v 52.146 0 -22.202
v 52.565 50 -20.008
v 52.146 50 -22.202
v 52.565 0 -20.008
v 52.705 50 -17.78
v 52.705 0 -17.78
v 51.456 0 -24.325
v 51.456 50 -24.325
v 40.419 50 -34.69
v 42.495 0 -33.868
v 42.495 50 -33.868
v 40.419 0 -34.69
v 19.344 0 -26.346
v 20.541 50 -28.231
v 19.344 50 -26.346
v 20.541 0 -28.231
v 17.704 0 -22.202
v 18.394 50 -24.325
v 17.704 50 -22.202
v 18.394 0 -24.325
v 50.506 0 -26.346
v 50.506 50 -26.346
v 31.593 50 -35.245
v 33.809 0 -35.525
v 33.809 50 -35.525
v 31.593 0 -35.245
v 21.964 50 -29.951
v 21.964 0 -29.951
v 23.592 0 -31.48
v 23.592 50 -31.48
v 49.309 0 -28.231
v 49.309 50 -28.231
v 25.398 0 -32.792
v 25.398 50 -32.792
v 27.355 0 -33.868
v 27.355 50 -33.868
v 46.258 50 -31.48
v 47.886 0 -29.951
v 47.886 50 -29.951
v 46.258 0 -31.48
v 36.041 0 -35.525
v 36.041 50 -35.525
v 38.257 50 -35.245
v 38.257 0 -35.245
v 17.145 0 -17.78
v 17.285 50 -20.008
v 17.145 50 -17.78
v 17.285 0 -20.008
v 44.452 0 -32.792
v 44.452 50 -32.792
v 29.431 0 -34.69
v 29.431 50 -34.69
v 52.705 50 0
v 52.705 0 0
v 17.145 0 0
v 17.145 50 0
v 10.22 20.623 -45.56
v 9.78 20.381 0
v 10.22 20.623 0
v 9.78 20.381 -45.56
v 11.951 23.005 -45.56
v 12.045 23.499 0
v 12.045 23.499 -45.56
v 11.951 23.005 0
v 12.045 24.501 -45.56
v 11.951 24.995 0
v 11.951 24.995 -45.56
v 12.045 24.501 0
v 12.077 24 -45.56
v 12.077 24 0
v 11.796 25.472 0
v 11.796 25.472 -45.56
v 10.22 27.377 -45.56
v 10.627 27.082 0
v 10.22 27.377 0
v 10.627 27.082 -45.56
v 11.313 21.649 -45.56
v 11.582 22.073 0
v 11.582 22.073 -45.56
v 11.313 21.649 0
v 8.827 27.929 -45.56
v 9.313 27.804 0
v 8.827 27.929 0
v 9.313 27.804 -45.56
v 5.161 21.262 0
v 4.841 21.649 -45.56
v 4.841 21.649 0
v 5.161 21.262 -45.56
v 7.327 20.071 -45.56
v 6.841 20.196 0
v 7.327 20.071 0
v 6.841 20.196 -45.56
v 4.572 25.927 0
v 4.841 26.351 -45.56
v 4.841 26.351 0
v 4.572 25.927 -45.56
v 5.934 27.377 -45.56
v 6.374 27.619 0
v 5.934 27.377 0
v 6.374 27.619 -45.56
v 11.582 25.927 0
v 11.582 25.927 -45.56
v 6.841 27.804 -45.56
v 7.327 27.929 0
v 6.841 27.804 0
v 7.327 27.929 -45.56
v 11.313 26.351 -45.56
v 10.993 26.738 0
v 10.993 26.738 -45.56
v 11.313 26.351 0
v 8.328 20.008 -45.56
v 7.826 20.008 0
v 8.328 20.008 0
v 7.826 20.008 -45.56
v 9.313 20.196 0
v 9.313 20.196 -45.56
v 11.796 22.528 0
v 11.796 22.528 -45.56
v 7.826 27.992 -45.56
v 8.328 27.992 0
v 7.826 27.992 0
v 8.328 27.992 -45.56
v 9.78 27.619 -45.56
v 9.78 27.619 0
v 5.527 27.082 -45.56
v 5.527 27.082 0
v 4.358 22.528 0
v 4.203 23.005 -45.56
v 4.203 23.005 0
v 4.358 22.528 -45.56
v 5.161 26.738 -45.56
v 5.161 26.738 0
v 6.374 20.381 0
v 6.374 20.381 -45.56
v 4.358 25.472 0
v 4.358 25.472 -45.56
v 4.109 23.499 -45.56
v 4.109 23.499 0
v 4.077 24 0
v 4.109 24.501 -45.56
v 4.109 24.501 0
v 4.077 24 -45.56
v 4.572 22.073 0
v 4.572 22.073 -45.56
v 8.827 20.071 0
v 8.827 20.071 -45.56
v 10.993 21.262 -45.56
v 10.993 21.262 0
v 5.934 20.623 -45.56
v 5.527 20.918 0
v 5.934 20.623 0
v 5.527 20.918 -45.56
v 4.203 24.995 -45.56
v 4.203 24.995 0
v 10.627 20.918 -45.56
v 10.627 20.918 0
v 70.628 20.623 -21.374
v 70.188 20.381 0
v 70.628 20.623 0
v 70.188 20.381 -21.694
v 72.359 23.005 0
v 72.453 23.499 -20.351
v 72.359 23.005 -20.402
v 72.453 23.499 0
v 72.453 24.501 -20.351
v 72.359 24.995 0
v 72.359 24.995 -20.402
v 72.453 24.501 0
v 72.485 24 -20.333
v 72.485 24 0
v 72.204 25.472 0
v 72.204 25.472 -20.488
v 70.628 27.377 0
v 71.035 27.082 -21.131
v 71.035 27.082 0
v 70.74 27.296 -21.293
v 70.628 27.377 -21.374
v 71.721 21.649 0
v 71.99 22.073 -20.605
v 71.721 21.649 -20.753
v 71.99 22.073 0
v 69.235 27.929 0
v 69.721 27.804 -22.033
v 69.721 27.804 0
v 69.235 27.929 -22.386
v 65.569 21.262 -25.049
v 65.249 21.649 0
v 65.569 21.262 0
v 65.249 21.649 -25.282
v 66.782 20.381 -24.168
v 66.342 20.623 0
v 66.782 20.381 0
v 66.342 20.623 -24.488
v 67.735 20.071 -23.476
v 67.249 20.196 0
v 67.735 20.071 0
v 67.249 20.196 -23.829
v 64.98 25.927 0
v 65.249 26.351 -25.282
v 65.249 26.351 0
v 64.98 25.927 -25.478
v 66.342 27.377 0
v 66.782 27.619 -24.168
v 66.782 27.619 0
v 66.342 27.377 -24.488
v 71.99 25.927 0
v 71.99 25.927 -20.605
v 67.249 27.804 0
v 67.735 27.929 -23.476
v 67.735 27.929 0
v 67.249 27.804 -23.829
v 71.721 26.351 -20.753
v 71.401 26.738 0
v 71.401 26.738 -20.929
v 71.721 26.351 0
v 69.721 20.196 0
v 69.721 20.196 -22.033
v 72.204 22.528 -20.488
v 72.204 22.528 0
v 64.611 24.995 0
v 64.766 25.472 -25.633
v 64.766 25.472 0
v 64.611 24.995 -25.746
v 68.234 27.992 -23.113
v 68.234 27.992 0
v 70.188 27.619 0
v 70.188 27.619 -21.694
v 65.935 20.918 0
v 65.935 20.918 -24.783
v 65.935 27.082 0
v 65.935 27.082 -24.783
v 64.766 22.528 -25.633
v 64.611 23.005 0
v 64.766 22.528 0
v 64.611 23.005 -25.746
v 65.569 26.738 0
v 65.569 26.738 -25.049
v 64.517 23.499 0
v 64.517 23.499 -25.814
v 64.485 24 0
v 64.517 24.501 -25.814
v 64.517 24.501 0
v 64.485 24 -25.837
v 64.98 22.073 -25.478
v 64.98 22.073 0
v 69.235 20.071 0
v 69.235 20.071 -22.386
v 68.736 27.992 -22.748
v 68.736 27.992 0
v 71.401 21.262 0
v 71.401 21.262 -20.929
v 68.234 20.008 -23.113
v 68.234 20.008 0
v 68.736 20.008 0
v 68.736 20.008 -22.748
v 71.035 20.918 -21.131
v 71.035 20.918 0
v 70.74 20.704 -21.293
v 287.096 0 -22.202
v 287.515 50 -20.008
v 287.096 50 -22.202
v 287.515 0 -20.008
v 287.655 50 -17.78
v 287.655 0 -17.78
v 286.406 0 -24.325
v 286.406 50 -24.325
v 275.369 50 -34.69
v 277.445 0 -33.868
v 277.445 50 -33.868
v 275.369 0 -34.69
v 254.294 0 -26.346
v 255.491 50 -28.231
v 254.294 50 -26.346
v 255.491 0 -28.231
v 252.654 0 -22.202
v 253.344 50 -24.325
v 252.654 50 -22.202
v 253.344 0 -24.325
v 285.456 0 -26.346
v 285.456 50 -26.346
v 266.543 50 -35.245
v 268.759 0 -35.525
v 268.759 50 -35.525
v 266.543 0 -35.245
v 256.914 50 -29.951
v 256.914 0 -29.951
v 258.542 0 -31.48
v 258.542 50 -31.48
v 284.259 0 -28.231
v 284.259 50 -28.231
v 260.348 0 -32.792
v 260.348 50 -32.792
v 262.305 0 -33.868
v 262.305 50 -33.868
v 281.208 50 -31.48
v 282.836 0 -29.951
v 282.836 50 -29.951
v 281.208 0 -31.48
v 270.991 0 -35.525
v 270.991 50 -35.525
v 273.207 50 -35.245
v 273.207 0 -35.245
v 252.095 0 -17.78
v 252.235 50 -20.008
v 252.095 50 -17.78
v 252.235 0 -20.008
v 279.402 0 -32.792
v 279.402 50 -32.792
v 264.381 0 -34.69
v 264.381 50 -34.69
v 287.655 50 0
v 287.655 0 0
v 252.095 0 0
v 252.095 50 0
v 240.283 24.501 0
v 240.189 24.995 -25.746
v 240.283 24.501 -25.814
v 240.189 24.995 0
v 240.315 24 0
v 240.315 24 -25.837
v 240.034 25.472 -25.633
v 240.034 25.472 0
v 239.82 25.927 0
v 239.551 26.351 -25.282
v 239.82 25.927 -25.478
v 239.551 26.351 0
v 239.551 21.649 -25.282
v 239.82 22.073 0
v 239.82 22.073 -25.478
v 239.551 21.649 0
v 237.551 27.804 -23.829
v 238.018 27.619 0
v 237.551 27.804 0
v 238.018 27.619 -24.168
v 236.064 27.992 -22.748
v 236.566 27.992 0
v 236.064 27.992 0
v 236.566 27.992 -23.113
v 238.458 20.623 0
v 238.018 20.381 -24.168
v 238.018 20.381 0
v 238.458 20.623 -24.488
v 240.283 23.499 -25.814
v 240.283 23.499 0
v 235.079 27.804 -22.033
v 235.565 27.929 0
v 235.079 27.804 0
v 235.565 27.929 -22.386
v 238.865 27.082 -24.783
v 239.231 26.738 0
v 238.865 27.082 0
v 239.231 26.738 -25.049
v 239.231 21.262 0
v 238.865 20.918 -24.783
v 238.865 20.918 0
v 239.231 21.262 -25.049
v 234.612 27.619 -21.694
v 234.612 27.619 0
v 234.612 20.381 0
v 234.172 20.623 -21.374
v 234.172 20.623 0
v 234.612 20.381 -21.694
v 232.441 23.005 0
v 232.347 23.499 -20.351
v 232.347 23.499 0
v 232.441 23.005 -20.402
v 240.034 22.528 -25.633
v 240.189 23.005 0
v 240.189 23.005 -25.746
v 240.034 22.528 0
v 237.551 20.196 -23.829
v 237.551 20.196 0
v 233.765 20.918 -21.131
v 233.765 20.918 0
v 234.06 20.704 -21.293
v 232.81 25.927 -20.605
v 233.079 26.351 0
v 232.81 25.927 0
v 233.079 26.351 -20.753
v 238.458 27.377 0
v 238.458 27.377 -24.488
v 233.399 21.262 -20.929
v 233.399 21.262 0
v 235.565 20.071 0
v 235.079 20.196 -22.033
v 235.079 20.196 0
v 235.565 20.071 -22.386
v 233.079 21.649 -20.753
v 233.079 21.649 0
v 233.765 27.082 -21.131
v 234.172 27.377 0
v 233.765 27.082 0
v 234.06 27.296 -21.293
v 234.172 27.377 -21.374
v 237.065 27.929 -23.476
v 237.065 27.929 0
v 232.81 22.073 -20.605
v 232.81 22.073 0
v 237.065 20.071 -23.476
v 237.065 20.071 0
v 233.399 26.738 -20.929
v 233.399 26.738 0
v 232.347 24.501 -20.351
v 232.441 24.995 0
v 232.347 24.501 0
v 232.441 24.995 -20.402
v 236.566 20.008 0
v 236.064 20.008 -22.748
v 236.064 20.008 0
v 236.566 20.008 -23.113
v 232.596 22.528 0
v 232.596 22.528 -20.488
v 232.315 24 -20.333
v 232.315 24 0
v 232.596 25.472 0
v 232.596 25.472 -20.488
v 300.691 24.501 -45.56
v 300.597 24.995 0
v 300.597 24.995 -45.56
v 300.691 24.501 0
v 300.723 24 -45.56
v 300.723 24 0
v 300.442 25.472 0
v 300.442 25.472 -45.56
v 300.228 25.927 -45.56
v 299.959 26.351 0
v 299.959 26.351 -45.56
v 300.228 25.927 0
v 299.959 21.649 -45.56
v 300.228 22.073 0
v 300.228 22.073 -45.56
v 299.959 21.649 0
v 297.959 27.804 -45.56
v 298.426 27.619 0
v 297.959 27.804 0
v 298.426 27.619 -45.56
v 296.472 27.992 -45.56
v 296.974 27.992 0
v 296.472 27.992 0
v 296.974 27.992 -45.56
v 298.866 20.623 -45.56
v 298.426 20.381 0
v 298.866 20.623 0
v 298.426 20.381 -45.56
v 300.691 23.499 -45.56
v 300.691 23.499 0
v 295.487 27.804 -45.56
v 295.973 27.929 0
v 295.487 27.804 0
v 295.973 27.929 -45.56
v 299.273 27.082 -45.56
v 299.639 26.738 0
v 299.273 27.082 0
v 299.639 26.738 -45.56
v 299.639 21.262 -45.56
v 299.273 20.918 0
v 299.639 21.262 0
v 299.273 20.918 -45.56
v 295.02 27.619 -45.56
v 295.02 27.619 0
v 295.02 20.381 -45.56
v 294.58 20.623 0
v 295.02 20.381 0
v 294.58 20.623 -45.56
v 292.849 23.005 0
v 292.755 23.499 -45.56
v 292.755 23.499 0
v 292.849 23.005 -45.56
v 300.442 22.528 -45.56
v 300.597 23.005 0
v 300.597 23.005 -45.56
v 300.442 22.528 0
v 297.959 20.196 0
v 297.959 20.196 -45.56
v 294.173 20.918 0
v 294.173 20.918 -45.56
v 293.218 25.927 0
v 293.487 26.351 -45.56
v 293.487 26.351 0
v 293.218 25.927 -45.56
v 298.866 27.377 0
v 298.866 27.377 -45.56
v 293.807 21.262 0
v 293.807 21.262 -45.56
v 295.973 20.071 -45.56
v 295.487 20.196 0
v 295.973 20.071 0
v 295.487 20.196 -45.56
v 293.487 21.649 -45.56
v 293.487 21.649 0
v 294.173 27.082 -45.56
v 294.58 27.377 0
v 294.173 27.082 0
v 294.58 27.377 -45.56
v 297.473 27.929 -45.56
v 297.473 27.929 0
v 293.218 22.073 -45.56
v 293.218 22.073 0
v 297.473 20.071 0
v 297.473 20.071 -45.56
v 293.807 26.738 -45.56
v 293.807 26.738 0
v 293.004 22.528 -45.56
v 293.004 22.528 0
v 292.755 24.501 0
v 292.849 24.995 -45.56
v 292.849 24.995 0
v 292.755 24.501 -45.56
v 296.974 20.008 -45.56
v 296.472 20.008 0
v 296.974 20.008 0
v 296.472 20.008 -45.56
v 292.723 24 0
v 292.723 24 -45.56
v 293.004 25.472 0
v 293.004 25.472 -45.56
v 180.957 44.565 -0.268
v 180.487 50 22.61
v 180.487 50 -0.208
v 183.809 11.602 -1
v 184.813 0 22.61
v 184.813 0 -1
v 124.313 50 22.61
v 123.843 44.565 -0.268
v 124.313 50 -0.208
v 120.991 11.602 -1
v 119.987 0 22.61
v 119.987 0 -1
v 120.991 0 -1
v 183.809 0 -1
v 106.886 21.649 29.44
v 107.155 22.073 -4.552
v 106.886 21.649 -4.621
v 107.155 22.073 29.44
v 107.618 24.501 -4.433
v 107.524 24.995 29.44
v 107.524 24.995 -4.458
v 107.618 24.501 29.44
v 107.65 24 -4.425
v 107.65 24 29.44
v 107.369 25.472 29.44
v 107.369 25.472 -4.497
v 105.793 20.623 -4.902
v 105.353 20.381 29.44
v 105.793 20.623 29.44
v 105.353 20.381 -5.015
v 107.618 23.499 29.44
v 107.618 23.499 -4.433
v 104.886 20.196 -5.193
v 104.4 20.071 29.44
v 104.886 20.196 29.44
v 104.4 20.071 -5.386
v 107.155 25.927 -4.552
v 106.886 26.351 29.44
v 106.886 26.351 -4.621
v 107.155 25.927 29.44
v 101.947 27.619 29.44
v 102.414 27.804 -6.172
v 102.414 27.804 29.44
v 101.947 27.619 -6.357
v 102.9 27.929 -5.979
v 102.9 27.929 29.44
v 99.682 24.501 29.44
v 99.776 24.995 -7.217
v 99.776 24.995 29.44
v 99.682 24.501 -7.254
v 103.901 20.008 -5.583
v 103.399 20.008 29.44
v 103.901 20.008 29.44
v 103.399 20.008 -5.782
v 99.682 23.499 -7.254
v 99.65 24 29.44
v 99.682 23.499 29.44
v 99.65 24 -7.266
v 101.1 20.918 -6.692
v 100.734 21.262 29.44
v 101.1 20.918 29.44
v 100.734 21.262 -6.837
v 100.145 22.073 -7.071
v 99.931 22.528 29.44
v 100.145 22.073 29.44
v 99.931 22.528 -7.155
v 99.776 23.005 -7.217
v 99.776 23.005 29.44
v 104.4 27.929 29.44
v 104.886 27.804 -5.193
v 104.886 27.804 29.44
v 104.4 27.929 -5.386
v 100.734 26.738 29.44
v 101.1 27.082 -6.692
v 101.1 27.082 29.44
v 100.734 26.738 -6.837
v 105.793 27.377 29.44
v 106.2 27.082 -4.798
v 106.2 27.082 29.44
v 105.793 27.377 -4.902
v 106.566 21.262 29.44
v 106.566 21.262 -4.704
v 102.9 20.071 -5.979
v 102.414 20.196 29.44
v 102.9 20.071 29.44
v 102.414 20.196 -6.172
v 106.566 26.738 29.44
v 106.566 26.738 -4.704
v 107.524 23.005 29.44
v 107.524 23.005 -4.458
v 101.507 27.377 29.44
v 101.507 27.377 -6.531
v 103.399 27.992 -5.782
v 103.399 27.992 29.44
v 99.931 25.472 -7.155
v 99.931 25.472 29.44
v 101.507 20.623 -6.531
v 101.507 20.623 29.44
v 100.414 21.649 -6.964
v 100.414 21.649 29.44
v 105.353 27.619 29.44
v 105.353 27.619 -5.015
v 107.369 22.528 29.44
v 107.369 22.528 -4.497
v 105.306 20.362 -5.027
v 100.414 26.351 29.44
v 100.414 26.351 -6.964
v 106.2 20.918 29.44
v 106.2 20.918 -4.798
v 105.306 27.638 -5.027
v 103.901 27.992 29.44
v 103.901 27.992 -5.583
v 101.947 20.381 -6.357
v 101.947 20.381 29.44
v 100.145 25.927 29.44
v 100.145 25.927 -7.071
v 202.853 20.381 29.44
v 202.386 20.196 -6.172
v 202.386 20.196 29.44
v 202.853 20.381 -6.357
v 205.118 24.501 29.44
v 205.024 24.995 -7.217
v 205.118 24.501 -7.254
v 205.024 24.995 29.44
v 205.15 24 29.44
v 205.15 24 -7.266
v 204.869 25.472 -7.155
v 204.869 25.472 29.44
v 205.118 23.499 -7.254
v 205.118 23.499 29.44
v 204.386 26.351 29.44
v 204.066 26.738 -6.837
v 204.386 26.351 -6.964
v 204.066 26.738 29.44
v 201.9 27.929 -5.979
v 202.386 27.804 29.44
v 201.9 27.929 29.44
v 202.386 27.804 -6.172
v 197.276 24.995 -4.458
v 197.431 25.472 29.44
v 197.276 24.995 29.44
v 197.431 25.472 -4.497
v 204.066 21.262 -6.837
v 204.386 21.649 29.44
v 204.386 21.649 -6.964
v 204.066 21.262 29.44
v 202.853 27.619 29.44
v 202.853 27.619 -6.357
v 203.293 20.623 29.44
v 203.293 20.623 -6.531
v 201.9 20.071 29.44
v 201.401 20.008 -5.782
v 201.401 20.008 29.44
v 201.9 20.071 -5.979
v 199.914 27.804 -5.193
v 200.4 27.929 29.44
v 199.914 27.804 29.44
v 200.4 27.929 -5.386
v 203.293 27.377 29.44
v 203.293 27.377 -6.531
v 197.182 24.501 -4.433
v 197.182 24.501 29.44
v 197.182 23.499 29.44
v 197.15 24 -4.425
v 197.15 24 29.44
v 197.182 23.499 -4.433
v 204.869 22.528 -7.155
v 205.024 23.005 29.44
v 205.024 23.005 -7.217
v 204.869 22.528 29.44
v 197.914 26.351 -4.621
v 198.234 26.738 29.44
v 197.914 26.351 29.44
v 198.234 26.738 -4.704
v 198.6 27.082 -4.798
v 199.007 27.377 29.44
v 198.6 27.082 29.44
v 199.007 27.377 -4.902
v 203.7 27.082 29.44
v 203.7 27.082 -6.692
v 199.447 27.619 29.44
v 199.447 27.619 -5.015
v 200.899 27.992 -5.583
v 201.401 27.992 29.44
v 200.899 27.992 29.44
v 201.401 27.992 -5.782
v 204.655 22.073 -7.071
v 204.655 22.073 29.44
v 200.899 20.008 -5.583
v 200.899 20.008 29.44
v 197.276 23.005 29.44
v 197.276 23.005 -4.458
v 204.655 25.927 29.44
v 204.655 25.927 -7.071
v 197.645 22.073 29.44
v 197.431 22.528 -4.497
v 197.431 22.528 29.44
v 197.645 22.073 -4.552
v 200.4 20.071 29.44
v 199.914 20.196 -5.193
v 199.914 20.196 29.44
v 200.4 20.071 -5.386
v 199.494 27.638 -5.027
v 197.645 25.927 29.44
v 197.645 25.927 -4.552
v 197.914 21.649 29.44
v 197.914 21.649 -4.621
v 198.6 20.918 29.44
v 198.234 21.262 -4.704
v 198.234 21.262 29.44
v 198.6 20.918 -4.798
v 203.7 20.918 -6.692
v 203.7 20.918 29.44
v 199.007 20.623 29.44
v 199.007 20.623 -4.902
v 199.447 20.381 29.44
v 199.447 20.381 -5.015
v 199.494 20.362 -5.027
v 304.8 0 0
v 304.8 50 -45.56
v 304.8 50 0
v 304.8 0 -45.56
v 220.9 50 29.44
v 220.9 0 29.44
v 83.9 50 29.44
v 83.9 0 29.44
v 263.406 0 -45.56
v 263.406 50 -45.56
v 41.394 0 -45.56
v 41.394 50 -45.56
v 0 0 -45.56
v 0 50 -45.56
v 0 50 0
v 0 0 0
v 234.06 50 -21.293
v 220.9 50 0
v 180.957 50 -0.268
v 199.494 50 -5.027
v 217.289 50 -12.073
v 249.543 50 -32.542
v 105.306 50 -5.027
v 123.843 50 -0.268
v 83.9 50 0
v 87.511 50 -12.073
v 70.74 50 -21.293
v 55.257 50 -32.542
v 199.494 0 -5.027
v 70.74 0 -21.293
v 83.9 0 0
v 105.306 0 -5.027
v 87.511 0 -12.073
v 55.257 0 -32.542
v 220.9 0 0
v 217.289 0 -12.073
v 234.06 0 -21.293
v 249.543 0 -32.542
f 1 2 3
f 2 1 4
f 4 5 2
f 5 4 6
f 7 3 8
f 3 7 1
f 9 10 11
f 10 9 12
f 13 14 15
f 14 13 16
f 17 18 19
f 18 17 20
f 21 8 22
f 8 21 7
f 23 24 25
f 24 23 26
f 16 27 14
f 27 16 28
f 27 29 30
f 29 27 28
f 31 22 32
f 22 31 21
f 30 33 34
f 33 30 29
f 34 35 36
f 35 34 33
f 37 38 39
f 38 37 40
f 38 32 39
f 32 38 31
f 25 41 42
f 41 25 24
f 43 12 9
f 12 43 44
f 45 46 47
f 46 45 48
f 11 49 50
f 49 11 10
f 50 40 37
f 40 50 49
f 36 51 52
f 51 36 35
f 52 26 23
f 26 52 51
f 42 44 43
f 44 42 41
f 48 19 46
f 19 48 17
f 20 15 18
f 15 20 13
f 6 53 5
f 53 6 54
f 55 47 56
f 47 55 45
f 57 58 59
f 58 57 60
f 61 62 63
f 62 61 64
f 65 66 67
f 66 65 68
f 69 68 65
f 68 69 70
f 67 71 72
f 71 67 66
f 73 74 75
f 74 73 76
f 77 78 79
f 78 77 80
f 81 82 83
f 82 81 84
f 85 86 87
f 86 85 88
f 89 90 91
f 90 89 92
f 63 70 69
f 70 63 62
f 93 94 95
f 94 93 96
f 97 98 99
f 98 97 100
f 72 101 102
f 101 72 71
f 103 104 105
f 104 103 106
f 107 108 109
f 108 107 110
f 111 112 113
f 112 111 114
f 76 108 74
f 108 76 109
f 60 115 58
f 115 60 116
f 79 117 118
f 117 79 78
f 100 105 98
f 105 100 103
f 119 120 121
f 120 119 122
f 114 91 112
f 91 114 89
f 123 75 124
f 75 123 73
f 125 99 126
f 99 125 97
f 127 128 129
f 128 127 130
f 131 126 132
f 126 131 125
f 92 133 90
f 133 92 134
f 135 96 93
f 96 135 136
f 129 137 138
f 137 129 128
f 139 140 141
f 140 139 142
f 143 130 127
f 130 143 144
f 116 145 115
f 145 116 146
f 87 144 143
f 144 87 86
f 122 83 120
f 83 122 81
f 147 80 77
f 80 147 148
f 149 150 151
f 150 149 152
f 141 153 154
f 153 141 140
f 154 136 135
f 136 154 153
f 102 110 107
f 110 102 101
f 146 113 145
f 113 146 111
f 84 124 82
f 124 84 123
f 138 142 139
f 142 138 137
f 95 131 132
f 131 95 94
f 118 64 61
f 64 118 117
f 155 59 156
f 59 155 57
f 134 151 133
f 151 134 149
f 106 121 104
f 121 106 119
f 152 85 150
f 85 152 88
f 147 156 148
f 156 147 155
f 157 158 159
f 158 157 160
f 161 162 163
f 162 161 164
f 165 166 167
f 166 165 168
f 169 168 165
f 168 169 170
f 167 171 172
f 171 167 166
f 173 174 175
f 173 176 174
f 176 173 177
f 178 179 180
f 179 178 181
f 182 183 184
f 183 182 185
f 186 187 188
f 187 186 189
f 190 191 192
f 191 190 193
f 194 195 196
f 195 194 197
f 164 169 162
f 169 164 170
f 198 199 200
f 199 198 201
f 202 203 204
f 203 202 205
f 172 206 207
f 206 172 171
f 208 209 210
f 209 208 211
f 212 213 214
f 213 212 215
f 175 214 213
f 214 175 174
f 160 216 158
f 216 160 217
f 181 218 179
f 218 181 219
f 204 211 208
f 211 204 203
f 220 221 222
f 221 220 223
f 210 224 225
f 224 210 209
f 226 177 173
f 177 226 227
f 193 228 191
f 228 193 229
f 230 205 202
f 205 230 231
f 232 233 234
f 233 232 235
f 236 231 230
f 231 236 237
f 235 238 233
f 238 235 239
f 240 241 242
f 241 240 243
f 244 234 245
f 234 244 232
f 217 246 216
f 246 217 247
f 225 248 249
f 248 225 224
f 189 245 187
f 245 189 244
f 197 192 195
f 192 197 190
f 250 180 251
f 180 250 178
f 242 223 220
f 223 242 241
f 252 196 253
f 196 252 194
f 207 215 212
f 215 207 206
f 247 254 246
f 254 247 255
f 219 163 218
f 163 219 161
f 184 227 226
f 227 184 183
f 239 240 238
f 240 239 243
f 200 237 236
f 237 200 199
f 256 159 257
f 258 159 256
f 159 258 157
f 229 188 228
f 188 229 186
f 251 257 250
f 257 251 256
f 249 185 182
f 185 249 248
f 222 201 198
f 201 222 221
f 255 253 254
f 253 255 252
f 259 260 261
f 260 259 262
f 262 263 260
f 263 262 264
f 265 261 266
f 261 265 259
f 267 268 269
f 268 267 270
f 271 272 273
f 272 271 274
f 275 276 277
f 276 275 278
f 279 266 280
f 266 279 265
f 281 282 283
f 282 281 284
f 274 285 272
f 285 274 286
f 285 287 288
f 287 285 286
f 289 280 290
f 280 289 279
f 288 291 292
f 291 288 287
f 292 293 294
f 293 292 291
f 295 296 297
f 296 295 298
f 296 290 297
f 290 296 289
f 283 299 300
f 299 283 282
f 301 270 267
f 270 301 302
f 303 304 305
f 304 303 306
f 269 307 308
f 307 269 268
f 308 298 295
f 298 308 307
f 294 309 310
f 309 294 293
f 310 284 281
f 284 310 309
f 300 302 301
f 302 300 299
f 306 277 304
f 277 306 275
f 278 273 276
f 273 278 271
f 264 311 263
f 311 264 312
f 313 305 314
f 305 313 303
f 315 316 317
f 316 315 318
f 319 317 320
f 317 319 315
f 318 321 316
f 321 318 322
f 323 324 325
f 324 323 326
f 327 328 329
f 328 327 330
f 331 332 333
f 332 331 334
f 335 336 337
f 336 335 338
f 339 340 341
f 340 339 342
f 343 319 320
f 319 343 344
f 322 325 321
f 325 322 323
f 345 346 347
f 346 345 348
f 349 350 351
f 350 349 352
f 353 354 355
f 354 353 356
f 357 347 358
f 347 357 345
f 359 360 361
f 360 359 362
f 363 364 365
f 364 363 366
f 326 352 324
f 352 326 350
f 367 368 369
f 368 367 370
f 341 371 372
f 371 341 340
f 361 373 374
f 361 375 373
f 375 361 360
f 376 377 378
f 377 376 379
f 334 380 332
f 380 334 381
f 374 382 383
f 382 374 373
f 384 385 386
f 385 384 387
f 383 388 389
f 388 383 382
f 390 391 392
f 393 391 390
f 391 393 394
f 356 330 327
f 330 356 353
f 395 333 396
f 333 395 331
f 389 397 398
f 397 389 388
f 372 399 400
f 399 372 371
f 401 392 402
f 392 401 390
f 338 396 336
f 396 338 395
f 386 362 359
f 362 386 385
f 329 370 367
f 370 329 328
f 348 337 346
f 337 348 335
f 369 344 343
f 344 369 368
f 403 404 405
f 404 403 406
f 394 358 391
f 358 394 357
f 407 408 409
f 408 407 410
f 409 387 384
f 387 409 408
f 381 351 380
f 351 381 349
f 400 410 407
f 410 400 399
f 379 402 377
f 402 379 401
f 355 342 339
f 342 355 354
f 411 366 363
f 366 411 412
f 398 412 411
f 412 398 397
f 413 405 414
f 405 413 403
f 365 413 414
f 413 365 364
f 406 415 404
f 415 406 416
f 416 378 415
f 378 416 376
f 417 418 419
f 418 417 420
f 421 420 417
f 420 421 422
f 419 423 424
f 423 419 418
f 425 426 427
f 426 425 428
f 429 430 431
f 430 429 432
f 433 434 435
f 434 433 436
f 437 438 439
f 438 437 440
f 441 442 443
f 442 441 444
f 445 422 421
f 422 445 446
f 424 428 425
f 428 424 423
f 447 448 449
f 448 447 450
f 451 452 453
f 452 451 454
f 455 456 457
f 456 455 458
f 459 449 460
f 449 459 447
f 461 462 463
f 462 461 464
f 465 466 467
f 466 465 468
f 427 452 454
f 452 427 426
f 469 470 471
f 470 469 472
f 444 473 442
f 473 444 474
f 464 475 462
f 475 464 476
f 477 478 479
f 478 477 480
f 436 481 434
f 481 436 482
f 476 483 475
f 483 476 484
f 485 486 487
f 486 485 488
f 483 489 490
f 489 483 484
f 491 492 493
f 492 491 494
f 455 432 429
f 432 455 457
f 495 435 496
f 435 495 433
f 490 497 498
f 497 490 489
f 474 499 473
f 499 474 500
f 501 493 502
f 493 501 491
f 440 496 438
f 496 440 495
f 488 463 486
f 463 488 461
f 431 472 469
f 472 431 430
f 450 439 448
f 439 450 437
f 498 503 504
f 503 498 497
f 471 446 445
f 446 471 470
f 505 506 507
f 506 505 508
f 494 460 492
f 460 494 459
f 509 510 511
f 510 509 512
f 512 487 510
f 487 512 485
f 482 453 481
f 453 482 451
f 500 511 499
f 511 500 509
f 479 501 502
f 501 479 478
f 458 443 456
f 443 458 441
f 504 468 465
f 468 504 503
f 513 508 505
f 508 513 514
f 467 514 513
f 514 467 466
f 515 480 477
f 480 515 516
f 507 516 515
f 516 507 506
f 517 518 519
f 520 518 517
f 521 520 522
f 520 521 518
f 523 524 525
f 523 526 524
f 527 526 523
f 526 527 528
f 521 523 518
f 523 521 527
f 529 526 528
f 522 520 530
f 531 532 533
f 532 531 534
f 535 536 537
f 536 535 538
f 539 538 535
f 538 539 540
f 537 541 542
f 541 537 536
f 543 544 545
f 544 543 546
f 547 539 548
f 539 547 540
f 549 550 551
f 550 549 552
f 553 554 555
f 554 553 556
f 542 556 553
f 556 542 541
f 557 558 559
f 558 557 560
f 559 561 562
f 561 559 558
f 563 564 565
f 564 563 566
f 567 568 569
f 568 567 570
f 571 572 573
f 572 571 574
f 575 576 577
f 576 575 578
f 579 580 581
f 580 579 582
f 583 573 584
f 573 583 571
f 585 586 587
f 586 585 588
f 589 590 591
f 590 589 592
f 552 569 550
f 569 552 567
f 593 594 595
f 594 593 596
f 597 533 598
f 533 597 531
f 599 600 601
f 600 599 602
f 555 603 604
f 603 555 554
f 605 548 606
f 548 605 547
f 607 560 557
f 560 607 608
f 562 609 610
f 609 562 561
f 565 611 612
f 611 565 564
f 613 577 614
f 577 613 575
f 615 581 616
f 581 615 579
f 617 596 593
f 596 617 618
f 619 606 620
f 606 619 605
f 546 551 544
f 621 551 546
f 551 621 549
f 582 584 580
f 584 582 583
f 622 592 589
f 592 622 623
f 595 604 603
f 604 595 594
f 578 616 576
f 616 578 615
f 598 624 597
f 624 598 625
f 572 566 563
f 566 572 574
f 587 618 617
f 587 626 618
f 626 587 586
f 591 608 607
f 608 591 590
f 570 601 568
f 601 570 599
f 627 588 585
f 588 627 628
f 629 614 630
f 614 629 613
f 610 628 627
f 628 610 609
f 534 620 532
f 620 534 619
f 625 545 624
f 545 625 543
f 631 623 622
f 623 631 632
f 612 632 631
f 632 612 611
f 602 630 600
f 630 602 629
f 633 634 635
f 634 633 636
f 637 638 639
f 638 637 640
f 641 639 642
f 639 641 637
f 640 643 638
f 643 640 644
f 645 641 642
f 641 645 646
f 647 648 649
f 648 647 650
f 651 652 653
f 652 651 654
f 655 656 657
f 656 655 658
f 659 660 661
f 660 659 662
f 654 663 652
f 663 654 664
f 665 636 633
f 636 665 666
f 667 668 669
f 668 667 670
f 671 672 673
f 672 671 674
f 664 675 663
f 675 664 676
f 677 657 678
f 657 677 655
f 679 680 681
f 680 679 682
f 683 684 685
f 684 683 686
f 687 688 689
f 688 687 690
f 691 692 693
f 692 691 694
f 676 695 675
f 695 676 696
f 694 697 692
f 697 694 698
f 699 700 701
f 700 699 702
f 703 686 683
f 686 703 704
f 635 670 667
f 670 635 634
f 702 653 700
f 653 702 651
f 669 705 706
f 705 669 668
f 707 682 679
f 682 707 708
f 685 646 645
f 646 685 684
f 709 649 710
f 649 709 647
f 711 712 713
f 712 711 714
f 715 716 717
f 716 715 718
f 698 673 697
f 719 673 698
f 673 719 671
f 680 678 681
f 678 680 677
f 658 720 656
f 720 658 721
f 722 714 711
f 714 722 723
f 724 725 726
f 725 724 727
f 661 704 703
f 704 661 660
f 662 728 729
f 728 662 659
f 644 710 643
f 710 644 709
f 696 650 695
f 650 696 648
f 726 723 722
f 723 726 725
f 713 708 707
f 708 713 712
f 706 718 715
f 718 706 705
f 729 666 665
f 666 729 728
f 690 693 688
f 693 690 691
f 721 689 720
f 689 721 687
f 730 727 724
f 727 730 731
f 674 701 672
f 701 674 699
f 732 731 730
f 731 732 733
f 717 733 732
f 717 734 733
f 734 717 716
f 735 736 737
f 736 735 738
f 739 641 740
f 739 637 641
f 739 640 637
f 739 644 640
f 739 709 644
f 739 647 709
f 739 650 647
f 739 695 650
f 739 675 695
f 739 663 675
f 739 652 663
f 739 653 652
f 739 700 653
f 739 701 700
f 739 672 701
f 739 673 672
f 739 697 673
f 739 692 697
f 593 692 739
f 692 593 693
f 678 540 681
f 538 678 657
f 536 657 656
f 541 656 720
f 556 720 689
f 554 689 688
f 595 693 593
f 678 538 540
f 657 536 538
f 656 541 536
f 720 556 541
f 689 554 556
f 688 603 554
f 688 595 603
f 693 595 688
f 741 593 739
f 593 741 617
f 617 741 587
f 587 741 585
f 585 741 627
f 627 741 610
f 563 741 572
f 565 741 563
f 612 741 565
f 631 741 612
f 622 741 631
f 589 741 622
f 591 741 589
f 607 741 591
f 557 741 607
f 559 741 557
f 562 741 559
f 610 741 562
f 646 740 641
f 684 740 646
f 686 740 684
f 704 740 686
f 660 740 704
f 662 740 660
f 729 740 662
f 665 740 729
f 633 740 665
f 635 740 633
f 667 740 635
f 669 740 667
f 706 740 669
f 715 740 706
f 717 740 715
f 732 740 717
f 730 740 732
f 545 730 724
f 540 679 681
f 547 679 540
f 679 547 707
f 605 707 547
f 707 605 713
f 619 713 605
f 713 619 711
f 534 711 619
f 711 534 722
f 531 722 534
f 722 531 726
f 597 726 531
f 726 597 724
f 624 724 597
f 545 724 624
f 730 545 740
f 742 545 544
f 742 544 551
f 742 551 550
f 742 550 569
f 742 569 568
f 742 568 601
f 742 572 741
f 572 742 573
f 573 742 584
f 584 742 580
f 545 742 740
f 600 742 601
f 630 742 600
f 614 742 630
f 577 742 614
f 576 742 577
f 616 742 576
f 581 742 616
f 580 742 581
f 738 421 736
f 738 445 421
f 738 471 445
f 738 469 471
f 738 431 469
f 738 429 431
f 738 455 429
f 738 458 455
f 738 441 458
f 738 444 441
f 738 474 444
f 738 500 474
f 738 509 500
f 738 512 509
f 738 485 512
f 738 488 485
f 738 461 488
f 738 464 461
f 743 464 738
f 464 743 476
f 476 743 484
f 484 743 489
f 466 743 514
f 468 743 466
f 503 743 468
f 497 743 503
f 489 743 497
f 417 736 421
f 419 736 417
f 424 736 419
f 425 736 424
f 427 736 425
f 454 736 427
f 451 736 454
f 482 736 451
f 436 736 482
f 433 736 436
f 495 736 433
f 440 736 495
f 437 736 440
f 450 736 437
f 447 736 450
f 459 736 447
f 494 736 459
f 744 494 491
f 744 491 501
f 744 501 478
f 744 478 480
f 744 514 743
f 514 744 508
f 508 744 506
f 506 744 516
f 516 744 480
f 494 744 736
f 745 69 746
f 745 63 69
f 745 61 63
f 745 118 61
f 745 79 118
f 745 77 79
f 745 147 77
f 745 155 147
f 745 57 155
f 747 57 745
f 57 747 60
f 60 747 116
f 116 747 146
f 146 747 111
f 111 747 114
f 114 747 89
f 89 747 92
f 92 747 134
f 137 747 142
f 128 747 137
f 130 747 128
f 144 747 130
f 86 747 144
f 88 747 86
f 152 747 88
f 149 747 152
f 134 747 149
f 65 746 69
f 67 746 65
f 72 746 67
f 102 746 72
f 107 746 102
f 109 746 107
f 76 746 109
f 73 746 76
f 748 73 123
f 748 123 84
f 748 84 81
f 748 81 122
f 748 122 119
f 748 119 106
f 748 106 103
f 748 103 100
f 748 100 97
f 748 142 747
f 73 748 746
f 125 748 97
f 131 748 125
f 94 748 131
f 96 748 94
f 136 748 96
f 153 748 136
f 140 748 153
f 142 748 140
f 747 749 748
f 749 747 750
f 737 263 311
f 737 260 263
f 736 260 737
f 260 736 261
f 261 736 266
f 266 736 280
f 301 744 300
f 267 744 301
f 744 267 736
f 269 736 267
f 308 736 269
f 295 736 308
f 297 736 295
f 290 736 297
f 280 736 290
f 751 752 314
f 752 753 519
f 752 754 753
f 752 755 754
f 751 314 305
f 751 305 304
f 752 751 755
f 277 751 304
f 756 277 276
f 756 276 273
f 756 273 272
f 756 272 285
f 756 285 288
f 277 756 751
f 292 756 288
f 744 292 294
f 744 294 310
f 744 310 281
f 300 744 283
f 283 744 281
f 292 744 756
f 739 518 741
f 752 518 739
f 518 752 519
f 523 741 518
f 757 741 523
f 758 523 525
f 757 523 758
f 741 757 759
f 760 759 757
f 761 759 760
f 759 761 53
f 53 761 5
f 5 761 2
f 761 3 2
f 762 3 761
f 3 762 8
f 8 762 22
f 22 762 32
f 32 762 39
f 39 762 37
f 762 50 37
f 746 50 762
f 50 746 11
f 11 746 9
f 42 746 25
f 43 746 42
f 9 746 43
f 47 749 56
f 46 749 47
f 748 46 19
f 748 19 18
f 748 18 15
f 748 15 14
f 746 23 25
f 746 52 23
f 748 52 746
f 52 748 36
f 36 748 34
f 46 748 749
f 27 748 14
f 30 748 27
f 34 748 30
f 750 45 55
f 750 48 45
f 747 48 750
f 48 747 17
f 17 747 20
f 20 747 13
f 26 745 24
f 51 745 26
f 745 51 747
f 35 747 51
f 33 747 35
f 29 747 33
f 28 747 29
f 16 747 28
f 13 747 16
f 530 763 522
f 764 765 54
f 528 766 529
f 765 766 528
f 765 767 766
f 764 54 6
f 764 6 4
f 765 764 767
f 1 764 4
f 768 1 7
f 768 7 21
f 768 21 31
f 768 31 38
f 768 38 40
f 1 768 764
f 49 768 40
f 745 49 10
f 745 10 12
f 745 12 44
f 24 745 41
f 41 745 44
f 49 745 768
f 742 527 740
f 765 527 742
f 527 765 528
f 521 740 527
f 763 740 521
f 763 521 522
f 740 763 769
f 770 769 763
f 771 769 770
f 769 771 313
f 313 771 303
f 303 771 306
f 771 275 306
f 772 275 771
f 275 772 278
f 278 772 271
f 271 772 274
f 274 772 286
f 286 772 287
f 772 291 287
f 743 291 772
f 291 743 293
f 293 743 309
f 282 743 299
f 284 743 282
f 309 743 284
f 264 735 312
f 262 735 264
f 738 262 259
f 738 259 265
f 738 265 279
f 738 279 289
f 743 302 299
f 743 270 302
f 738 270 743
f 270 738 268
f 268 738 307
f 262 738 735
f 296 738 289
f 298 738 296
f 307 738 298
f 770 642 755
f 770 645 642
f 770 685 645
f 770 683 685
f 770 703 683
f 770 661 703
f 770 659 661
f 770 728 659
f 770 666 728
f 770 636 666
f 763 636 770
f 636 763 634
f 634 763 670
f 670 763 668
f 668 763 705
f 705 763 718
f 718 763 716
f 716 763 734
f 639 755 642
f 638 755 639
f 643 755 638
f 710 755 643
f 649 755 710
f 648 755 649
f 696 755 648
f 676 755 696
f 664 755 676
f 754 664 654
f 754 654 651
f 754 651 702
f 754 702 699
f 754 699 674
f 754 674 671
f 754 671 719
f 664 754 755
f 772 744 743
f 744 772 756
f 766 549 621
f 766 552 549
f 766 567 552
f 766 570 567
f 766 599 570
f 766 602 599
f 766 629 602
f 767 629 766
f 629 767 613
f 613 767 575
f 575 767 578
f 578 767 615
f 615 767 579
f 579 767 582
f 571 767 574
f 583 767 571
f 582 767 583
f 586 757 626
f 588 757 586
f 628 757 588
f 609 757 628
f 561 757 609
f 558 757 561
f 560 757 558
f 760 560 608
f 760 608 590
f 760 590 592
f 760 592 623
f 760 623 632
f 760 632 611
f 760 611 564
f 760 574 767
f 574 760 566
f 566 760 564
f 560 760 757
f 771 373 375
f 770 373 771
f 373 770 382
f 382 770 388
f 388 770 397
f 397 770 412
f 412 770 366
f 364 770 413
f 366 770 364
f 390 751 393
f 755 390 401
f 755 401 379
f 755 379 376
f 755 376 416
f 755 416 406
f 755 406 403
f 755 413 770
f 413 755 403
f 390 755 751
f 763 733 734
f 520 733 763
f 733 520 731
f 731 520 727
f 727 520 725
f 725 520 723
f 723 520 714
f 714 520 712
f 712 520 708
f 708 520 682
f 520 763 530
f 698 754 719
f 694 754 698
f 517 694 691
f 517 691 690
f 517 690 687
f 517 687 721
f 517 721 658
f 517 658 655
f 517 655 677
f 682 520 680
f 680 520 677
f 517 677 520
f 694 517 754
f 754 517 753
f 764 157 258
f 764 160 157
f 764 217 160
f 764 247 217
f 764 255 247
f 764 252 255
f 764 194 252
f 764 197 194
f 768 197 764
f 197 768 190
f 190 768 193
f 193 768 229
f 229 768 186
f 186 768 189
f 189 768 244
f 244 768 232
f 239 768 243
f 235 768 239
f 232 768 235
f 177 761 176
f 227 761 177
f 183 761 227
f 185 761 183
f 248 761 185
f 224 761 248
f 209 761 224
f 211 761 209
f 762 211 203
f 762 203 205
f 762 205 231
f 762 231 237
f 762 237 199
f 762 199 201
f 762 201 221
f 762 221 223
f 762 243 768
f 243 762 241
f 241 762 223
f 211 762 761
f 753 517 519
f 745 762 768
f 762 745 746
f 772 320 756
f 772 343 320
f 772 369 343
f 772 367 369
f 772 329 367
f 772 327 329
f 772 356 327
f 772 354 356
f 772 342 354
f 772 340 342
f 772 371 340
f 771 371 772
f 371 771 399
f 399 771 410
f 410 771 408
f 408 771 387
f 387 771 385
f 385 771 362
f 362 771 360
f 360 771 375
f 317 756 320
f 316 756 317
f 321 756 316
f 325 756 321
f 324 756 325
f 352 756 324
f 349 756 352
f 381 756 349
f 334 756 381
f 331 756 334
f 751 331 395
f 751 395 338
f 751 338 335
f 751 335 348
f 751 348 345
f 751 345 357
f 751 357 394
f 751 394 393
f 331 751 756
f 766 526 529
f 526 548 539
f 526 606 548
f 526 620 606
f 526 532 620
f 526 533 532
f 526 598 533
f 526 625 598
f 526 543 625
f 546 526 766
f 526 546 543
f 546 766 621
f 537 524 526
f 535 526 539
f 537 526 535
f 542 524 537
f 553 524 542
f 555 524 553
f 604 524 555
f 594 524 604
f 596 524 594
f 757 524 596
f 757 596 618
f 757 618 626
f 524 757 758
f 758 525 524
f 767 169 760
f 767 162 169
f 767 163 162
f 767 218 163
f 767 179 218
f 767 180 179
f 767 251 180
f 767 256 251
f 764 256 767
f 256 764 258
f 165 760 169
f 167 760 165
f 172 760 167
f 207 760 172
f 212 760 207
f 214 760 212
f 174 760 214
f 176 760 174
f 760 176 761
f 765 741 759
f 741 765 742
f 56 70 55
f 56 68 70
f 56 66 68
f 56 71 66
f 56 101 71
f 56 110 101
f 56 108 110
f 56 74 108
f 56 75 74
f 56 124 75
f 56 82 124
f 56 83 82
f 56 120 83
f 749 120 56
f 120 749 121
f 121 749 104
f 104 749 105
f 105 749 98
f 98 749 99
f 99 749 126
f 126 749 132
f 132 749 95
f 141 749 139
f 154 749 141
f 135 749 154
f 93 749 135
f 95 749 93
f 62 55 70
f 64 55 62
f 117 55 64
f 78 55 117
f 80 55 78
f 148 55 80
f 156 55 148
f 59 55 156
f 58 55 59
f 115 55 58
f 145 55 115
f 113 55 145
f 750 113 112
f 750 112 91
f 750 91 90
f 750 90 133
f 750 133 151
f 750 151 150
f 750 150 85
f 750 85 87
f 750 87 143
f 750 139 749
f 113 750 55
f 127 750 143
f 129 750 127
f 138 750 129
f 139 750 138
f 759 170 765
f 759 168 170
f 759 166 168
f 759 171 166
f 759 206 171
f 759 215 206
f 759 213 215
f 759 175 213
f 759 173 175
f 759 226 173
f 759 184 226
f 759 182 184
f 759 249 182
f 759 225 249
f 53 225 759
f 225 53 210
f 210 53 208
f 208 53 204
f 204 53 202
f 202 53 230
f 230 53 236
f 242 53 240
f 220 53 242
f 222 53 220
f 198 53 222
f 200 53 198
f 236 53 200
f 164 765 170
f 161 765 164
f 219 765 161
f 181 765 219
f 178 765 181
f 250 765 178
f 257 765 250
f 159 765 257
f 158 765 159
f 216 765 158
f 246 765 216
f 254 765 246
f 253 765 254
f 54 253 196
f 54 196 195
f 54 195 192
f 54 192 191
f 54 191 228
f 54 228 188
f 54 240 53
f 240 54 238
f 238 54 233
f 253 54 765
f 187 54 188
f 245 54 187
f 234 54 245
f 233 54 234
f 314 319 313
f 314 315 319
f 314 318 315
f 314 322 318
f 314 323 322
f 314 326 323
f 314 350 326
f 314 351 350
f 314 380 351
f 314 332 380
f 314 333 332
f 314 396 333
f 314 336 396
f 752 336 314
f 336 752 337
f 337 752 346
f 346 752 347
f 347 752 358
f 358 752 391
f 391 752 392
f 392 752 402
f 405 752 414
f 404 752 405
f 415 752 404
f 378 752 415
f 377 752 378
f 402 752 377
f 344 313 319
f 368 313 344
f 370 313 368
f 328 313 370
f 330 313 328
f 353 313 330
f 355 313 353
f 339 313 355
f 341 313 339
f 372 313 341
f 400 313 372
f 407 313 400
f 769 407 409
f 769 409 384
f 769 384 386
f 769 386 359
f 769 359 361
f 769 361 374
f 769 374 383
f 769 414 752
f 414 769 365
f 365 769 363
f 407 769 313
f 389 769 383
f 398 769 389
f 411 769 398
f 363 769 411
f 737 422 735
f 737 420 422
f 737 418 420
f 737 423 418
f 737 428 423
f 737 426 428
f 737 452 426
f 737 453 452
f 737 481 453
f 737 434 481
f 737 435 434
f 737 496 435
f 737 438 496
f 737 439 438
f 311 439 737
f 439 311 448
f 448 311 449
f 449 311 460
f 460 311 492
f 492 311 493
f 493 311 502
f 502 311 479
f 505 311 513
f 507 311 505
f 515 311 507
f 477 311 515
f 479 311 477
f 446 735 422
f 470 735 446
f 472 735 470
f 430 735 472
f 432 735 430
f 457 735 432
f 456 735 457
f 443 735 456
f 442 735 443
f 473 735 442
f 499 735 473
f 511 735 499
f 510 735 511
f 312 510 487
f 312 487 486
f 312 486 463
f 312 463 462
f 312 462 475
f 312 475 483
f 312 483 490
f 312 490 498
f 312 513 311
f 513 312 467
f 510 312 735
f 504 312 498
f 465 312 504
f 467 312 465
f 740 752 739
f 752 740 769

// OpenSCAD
/*
    Speederbike ...outrigger? braces
*/

TOLERANCE = 2;
MIN_WALL_THICKNESS = 10;

LENGTH = 304.8;                 // 12"
WIDTH = 50;
HEIGHT = 75; //25.4;

PIPE_OD = 33.56;                // 1" PVC measured OD, not even close to 1"
PIPE_INSIDE_SPACING = 234.95;   // 9.25"
TOP_TUBE_DIAMETER = 22.61;
TOP_TUBE_SLOT = 56; //54.19;
TOP_TUBE_GAP = 15;
BOLT_DIAMETER = 8;              // slightly larger than 1/4"

$fn=50;

difference(){
    translate([0,0,-(PIPE_OD+TOLERANCE)-MIN_WALL_THICKNESS]){
        cube([LENGTH,WIDTH,HEIGHT]);
    }
    
    // pipe holders
    translate([(LENGTH/2)-(PIPE_INSIDE_SPACING/2),-1,-(PIPE_OD+TOLERANCE)/2]){
        rotate([-90,0,0]){
            cylinder(r=(PIPE_OD+TOLERANCE)/2,h=WIDTH+2);            
        }
        translate([-(PIPE_OD+TOLERANCE)/2,0,0]){
            cube([PIPE_OD+TOLERANCE,WIDTH+2,HEIGHT]);
        }
    
        // bolt holes
        translate([-PIPE_OD*0.80,WIDTH/2,-PIPE_OD]){
            cylinder(r=BOLT_DIAMETER/2,h=HEIGHT+2);
        }
        translate([PIPE_OD,WIDTH/2,-PIPE_OD]){
            cylinder(r=BOLT_DIAMETER/2,h=HEIGHT+2);
        }    
    }
    translate([(LENGTH/2)+(PIPE_INSIDE_SPACING/2),-1,-(PIPE_OD+TOLERANCE)/2]){
        rotate([-90,0,0]){
            cylinder(r=(PIPE_OD+TOLERANCE)/2,h=WIDTH+2);
        }
        translate([-(PIPE_OD+TOLERANCE)/2,0,0]){
            cube([PIPE_OD+TOLERANCE,WIDTH+2,HEIGHT]);
        }
        
        // bolt holes
        translate([-PIPE_OD,WIDTH/2,-PIPE_OD]){
            cylinder(r=BOLT_DIAMETER/2,h=HEIGHT+2);
        }
        translate([PIPE_OD*0.80,WIDTH/2,-PIPE_OD]){
            cylinder(r=BOLT_DIAMETER/2,h=HEIGHT+2);
        }
    }
    
    // top-tube slot
    tt_min = TOP_TUBE_SLOT;    // TOP_TUBE_SLOT
    tt_max = 65;    // fresh measurement
    
    translate([(LENGTH/2)-(tt_max/2),-1,-1]){
        //cube([TOP_TUBE_SLOT,WIDTH+2,TOP_TUBE_DIAMETER+1]);
        
        linear_extrude(TOP_TUBE_DIAMETER+1){
            polygon([[0,0],[(tt_max-tt_min)/2,WIDTH+2],[tt_max-((tt_max-tt_min))/2,WIDTH+2],[tt_max,0]]);
        }
        
        // bolt holes
        translate([-tt_max/4,WIDTH/2,-TOP_TUBE_DIAMETER]){
            cylinder(r=BOLT_DIAMETER/2,h=HEIGHT);
        }
        translate([tt_max+(tt_max/4),WIDTH/2,-TOP_TUBE_DIAMETER]){
            cylinder(r=BOLT_DIAMETER/2,h=HEIGHT);
        }
    }
    
    // cut-out excess underneath
    translate([LENGTH/2,-1,-((PIPE_OD+TOLERANCE)-MIN_WALL_THICKNESS)-LENGTH/2.45]){
        rotate([-90,0,0]){
            cylinder(r=LENGTH/2,h=WIDTH+2);
        }
    }
    
    // cut-out excess above pipes
    translate([-1,-1,0]){
        cube([PIPE_OD*2.5+1,WIDTH+2,HEIGHT]);
    }
    translate([LENGTH-(PIPE_OD*2.5),-1,0]){
        cube([PIPE_OD*2.5+1,WIDTH+2,HEIGHT]);
    }
}
